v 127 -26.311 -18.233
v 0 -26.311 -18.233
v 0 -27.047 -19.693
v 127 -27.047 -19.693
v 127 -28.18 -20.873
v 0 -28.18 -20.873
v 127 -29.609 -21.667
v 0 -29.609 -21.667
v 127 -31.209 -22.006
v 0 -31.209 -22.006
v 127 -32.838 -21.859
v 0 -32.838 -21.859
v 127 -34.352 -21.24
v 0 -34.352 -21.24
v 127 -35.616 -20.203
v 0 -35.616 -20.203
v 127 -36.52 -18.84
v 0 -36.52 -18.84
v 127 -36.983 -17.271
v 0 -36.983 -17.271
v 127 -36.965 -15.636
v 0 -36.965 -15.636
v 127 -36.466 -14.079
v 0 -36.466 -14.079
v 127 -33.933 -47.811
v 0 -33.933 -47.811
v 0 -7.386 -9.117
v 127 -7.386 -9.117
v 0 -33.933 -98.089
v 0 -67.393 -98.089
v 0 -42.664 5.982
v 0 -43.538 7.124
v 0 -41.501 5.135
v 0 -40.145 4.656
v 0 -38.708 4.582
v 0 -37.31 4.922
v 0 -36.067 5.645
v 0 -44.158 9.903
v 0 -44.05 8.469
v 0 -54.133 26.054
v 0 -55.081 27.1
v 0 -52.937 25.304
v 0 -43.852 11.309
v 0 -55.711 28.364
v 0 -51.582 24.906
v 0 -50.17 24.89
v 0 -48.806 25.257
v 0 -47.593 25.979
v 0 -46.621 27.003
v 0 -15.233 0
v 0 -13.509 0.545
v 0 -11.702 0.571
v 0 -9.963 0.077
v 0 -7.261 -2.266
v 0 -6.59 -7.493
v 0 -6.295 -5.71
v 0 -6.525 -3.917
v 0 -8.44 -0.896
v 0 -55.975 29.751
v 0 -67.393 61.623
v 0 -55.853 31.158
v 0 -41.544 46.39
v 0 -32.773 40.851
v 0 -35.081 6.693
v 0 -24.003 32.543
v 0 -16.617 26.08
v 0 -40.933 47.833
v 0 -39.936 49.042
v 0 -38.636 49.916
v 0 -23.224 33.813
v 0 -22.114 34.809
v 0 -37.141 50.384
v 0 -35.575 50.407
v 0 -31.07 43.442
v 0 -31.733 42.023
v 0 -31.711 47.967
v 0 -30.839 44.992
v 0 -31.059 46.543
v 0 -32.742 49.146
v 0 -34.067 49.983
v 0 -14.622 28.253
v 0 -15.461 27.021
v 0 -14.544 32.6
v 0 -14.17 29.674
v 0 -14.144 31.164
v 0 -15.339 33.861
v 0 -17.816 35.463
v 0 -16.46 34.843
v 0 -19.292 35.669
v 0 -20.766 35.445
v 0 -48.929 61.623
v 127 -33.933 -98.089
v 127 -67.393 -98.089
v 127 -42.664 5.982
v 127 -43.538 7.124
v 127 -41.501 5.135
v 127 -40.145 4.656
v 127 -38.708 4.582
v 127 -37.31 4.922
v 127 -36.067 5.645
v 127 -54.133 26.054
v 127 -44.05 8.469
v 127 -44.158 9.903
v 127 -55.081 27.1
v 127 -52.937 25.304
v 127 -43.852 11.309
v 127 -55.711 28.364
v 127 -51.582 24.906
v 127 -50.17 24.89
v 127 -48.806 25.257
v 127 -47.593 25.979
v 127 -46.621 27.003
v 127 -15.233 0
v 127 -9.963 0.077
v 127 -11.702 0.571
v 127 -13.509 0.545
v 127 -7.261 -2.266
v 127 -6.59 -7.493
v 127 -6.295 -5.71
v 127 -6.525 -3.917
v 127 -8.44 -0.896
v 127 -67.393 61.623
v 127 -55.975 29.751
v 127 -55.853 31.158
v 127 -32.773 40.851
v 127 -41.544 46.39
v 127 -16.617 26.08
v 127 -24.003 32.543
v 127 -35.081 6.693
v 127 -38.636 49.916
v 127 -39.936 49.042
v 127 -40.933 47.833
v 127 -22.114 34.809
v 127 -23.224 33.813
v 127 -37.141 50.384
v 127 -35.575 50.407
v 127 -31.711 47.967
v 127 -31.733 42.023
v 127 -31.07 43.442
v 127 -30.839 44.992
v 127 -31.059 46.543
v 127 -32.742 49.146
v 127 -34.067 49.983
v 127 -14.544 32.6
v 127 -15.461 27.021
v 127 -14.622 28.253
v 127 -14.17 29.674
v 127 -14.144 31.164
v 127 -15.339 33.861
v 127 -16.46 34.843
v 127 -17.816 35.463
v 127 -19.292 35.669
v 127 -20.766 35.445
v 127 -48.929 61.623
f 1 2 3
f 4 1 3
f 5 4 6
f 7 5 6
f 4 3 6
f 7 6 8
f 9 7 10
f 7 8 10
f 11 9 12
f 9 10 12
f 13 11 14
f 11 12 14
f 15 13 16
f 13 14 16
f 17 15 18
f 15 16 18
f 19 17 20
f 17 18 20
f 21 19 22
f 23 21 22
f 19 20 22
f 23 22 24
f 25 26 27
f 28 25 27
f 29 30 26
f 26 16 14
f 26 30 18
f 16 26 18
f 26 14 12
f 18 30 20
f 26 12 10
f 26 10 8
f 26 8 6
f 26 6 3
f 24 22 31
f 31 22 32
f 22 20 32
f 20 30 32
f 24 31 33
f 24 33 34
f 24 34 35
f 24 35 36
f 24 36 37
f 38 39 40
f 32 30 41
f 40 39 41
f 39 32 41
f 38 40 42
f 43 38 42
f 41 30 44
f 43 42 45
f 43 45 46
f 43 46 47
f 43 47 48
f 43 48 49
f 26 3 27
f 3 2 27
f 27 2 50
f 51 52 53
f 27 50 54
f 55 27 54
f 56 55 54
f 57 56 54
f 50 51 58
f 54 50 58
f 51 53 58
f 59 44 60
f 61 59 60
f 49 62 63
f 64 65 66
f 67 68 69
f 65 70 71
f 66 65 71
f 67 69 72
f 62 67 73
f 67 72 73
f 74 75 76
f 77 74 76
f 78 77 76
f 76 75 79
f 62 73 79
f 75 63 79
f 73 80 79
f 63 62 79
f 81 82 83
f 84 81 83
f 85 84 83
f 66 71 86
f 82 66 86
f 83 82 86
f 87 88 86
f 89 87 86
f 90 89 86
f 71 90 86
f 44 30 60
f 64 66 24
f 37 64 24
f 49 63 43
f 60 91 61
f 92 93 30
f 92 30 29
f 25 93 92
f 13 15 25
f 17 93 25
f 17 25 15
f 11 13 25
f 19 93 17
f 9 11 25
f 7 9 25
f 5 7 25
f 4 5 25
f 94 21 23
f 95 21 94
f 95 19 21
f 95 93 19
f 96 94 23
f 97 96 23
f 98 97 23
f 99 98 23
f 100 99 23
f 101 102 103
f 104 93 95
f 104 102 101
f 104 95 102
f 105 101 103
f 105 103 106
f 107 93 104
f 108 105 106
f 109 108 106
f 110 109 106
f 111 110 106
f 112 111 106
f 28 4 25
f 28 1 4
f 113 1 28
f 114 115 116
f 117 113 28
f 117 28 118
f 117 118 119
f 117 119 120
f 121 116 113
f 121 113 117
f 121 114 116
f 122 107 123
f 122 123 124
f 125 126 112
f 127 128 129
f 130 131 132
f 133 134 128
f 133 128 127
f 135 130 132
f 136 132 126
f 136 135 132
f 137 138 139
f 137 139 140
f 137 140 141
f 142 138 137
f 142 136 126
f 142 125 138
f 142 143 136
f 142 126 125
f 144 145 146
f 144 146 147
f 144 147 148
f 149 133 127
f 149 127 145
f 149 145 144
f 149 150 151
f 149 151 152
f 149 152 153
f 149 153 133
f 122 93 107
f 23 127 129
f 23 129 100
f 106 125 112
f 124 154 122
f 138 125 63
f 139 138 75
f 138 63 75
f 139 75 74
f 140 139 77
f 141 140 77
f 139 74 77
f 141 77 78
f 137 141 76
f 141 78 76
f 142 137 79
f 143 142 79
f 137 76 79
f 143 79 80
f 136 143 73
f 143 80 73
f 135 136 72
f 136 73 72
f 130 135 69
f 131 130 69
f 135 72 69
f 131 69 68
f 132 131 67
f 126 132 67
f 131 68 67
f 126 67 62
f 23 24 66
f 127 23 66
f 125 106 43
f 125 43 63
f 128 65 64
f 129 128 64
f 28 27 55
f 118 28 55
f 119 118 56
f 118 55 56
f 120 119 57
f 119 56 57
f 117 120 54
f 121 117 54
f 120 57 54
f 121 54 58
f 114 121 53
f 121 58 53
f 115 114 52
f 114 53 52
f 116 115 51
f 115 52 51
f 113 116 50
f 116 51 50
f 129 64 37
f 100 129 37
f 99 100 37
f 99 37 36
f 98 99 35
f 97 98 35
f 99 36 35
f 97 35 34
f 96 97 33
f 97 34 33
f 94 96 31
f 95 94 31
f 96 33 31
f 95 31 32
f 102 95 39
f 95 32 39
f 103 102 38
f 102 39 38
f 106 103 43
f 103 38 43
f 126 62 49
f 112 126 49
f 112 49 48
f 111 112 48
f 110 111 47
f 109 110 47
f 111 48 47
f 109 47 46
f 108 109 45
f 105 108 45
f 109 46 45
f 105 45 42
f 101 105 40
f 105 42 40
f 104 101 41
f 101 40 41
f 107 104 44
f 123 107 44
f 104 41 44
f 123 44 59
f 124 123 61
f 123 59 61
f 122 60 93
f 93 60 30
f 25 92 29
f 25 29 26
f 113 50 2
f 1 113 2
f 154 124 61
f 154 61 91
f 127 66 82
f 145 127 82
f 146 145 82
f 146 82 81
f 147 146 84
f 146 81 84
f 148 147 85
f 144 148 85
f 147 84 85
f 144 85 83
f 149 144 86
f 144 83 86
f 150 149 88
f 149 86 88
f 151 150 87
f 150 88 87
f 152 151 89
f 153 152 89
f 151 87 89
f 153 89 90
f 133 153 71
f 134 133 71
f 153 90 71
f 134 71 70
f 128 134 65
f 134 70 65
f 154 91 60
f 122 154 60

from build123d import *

# Parameters (mm, degrees)
F1_DEPTH = 127


with BuildPart() as f1:
    # F0 (on Right) → F1 (new body)
    with BuildSketch(Plane.YZ):
        with BuildLine():
            Line((-48.929181, 61.623078), (-67.393027, 61.623078))
            Line((-67.393027, 61.623078), (-67.393027, -98.089159))
            Line((-67.393027, -98.089159), (-33.93315, -98.089159))
            Line((-33.93315, -98.089159), (-33.93315, -47.811495))
            Line((-33.93315, -47.811495), (-7.385537, -9.11652))
            ThreePointArc((-7.385537, -9.11652), (-7.800447, -1.53815), (-15.232671, 0))
            Line((-15.232671, 0), (-26.310977, -18.23304))
            ThreePointArc((-26.310977, -18.23304), (-33.618065, -21.605825), (-36.466088, -14.078676))
            Line((-36.466088, -14.078676), (-16.617458, 26.080182))
            ThreePointArc((-16.617458, 26.080182), (-15.863933, 34.392833), (-24.002995, 32.542527))
            Line((-24.002995, 32.542527), (-35.081301, 6.693146))
            ThreePointArc((-35.081301, 6.693146), (-41.501132, 5.135256), (-43.851625, 11.309107))
            Line((-43.851625, 11.309107), (-32.77332, 40.851254))
            ThreePointArc((-32.77332, 40.851254), (-33.374387, 49.612313), (-41.543644, 46.390408))
            Line((-41.543644, 46.390408), (-46.621203, 27.003372))
            ThreePointArc((-46.621203, 27.003372), (-52.936608, 25.304014), (-55.853125, 31.157738))
            Line((-55.853125, 31.157738), (-48.929181, 61.623078))
        make_face()
    extrude(amount=F1_DEPTH)


solid = f1.part
